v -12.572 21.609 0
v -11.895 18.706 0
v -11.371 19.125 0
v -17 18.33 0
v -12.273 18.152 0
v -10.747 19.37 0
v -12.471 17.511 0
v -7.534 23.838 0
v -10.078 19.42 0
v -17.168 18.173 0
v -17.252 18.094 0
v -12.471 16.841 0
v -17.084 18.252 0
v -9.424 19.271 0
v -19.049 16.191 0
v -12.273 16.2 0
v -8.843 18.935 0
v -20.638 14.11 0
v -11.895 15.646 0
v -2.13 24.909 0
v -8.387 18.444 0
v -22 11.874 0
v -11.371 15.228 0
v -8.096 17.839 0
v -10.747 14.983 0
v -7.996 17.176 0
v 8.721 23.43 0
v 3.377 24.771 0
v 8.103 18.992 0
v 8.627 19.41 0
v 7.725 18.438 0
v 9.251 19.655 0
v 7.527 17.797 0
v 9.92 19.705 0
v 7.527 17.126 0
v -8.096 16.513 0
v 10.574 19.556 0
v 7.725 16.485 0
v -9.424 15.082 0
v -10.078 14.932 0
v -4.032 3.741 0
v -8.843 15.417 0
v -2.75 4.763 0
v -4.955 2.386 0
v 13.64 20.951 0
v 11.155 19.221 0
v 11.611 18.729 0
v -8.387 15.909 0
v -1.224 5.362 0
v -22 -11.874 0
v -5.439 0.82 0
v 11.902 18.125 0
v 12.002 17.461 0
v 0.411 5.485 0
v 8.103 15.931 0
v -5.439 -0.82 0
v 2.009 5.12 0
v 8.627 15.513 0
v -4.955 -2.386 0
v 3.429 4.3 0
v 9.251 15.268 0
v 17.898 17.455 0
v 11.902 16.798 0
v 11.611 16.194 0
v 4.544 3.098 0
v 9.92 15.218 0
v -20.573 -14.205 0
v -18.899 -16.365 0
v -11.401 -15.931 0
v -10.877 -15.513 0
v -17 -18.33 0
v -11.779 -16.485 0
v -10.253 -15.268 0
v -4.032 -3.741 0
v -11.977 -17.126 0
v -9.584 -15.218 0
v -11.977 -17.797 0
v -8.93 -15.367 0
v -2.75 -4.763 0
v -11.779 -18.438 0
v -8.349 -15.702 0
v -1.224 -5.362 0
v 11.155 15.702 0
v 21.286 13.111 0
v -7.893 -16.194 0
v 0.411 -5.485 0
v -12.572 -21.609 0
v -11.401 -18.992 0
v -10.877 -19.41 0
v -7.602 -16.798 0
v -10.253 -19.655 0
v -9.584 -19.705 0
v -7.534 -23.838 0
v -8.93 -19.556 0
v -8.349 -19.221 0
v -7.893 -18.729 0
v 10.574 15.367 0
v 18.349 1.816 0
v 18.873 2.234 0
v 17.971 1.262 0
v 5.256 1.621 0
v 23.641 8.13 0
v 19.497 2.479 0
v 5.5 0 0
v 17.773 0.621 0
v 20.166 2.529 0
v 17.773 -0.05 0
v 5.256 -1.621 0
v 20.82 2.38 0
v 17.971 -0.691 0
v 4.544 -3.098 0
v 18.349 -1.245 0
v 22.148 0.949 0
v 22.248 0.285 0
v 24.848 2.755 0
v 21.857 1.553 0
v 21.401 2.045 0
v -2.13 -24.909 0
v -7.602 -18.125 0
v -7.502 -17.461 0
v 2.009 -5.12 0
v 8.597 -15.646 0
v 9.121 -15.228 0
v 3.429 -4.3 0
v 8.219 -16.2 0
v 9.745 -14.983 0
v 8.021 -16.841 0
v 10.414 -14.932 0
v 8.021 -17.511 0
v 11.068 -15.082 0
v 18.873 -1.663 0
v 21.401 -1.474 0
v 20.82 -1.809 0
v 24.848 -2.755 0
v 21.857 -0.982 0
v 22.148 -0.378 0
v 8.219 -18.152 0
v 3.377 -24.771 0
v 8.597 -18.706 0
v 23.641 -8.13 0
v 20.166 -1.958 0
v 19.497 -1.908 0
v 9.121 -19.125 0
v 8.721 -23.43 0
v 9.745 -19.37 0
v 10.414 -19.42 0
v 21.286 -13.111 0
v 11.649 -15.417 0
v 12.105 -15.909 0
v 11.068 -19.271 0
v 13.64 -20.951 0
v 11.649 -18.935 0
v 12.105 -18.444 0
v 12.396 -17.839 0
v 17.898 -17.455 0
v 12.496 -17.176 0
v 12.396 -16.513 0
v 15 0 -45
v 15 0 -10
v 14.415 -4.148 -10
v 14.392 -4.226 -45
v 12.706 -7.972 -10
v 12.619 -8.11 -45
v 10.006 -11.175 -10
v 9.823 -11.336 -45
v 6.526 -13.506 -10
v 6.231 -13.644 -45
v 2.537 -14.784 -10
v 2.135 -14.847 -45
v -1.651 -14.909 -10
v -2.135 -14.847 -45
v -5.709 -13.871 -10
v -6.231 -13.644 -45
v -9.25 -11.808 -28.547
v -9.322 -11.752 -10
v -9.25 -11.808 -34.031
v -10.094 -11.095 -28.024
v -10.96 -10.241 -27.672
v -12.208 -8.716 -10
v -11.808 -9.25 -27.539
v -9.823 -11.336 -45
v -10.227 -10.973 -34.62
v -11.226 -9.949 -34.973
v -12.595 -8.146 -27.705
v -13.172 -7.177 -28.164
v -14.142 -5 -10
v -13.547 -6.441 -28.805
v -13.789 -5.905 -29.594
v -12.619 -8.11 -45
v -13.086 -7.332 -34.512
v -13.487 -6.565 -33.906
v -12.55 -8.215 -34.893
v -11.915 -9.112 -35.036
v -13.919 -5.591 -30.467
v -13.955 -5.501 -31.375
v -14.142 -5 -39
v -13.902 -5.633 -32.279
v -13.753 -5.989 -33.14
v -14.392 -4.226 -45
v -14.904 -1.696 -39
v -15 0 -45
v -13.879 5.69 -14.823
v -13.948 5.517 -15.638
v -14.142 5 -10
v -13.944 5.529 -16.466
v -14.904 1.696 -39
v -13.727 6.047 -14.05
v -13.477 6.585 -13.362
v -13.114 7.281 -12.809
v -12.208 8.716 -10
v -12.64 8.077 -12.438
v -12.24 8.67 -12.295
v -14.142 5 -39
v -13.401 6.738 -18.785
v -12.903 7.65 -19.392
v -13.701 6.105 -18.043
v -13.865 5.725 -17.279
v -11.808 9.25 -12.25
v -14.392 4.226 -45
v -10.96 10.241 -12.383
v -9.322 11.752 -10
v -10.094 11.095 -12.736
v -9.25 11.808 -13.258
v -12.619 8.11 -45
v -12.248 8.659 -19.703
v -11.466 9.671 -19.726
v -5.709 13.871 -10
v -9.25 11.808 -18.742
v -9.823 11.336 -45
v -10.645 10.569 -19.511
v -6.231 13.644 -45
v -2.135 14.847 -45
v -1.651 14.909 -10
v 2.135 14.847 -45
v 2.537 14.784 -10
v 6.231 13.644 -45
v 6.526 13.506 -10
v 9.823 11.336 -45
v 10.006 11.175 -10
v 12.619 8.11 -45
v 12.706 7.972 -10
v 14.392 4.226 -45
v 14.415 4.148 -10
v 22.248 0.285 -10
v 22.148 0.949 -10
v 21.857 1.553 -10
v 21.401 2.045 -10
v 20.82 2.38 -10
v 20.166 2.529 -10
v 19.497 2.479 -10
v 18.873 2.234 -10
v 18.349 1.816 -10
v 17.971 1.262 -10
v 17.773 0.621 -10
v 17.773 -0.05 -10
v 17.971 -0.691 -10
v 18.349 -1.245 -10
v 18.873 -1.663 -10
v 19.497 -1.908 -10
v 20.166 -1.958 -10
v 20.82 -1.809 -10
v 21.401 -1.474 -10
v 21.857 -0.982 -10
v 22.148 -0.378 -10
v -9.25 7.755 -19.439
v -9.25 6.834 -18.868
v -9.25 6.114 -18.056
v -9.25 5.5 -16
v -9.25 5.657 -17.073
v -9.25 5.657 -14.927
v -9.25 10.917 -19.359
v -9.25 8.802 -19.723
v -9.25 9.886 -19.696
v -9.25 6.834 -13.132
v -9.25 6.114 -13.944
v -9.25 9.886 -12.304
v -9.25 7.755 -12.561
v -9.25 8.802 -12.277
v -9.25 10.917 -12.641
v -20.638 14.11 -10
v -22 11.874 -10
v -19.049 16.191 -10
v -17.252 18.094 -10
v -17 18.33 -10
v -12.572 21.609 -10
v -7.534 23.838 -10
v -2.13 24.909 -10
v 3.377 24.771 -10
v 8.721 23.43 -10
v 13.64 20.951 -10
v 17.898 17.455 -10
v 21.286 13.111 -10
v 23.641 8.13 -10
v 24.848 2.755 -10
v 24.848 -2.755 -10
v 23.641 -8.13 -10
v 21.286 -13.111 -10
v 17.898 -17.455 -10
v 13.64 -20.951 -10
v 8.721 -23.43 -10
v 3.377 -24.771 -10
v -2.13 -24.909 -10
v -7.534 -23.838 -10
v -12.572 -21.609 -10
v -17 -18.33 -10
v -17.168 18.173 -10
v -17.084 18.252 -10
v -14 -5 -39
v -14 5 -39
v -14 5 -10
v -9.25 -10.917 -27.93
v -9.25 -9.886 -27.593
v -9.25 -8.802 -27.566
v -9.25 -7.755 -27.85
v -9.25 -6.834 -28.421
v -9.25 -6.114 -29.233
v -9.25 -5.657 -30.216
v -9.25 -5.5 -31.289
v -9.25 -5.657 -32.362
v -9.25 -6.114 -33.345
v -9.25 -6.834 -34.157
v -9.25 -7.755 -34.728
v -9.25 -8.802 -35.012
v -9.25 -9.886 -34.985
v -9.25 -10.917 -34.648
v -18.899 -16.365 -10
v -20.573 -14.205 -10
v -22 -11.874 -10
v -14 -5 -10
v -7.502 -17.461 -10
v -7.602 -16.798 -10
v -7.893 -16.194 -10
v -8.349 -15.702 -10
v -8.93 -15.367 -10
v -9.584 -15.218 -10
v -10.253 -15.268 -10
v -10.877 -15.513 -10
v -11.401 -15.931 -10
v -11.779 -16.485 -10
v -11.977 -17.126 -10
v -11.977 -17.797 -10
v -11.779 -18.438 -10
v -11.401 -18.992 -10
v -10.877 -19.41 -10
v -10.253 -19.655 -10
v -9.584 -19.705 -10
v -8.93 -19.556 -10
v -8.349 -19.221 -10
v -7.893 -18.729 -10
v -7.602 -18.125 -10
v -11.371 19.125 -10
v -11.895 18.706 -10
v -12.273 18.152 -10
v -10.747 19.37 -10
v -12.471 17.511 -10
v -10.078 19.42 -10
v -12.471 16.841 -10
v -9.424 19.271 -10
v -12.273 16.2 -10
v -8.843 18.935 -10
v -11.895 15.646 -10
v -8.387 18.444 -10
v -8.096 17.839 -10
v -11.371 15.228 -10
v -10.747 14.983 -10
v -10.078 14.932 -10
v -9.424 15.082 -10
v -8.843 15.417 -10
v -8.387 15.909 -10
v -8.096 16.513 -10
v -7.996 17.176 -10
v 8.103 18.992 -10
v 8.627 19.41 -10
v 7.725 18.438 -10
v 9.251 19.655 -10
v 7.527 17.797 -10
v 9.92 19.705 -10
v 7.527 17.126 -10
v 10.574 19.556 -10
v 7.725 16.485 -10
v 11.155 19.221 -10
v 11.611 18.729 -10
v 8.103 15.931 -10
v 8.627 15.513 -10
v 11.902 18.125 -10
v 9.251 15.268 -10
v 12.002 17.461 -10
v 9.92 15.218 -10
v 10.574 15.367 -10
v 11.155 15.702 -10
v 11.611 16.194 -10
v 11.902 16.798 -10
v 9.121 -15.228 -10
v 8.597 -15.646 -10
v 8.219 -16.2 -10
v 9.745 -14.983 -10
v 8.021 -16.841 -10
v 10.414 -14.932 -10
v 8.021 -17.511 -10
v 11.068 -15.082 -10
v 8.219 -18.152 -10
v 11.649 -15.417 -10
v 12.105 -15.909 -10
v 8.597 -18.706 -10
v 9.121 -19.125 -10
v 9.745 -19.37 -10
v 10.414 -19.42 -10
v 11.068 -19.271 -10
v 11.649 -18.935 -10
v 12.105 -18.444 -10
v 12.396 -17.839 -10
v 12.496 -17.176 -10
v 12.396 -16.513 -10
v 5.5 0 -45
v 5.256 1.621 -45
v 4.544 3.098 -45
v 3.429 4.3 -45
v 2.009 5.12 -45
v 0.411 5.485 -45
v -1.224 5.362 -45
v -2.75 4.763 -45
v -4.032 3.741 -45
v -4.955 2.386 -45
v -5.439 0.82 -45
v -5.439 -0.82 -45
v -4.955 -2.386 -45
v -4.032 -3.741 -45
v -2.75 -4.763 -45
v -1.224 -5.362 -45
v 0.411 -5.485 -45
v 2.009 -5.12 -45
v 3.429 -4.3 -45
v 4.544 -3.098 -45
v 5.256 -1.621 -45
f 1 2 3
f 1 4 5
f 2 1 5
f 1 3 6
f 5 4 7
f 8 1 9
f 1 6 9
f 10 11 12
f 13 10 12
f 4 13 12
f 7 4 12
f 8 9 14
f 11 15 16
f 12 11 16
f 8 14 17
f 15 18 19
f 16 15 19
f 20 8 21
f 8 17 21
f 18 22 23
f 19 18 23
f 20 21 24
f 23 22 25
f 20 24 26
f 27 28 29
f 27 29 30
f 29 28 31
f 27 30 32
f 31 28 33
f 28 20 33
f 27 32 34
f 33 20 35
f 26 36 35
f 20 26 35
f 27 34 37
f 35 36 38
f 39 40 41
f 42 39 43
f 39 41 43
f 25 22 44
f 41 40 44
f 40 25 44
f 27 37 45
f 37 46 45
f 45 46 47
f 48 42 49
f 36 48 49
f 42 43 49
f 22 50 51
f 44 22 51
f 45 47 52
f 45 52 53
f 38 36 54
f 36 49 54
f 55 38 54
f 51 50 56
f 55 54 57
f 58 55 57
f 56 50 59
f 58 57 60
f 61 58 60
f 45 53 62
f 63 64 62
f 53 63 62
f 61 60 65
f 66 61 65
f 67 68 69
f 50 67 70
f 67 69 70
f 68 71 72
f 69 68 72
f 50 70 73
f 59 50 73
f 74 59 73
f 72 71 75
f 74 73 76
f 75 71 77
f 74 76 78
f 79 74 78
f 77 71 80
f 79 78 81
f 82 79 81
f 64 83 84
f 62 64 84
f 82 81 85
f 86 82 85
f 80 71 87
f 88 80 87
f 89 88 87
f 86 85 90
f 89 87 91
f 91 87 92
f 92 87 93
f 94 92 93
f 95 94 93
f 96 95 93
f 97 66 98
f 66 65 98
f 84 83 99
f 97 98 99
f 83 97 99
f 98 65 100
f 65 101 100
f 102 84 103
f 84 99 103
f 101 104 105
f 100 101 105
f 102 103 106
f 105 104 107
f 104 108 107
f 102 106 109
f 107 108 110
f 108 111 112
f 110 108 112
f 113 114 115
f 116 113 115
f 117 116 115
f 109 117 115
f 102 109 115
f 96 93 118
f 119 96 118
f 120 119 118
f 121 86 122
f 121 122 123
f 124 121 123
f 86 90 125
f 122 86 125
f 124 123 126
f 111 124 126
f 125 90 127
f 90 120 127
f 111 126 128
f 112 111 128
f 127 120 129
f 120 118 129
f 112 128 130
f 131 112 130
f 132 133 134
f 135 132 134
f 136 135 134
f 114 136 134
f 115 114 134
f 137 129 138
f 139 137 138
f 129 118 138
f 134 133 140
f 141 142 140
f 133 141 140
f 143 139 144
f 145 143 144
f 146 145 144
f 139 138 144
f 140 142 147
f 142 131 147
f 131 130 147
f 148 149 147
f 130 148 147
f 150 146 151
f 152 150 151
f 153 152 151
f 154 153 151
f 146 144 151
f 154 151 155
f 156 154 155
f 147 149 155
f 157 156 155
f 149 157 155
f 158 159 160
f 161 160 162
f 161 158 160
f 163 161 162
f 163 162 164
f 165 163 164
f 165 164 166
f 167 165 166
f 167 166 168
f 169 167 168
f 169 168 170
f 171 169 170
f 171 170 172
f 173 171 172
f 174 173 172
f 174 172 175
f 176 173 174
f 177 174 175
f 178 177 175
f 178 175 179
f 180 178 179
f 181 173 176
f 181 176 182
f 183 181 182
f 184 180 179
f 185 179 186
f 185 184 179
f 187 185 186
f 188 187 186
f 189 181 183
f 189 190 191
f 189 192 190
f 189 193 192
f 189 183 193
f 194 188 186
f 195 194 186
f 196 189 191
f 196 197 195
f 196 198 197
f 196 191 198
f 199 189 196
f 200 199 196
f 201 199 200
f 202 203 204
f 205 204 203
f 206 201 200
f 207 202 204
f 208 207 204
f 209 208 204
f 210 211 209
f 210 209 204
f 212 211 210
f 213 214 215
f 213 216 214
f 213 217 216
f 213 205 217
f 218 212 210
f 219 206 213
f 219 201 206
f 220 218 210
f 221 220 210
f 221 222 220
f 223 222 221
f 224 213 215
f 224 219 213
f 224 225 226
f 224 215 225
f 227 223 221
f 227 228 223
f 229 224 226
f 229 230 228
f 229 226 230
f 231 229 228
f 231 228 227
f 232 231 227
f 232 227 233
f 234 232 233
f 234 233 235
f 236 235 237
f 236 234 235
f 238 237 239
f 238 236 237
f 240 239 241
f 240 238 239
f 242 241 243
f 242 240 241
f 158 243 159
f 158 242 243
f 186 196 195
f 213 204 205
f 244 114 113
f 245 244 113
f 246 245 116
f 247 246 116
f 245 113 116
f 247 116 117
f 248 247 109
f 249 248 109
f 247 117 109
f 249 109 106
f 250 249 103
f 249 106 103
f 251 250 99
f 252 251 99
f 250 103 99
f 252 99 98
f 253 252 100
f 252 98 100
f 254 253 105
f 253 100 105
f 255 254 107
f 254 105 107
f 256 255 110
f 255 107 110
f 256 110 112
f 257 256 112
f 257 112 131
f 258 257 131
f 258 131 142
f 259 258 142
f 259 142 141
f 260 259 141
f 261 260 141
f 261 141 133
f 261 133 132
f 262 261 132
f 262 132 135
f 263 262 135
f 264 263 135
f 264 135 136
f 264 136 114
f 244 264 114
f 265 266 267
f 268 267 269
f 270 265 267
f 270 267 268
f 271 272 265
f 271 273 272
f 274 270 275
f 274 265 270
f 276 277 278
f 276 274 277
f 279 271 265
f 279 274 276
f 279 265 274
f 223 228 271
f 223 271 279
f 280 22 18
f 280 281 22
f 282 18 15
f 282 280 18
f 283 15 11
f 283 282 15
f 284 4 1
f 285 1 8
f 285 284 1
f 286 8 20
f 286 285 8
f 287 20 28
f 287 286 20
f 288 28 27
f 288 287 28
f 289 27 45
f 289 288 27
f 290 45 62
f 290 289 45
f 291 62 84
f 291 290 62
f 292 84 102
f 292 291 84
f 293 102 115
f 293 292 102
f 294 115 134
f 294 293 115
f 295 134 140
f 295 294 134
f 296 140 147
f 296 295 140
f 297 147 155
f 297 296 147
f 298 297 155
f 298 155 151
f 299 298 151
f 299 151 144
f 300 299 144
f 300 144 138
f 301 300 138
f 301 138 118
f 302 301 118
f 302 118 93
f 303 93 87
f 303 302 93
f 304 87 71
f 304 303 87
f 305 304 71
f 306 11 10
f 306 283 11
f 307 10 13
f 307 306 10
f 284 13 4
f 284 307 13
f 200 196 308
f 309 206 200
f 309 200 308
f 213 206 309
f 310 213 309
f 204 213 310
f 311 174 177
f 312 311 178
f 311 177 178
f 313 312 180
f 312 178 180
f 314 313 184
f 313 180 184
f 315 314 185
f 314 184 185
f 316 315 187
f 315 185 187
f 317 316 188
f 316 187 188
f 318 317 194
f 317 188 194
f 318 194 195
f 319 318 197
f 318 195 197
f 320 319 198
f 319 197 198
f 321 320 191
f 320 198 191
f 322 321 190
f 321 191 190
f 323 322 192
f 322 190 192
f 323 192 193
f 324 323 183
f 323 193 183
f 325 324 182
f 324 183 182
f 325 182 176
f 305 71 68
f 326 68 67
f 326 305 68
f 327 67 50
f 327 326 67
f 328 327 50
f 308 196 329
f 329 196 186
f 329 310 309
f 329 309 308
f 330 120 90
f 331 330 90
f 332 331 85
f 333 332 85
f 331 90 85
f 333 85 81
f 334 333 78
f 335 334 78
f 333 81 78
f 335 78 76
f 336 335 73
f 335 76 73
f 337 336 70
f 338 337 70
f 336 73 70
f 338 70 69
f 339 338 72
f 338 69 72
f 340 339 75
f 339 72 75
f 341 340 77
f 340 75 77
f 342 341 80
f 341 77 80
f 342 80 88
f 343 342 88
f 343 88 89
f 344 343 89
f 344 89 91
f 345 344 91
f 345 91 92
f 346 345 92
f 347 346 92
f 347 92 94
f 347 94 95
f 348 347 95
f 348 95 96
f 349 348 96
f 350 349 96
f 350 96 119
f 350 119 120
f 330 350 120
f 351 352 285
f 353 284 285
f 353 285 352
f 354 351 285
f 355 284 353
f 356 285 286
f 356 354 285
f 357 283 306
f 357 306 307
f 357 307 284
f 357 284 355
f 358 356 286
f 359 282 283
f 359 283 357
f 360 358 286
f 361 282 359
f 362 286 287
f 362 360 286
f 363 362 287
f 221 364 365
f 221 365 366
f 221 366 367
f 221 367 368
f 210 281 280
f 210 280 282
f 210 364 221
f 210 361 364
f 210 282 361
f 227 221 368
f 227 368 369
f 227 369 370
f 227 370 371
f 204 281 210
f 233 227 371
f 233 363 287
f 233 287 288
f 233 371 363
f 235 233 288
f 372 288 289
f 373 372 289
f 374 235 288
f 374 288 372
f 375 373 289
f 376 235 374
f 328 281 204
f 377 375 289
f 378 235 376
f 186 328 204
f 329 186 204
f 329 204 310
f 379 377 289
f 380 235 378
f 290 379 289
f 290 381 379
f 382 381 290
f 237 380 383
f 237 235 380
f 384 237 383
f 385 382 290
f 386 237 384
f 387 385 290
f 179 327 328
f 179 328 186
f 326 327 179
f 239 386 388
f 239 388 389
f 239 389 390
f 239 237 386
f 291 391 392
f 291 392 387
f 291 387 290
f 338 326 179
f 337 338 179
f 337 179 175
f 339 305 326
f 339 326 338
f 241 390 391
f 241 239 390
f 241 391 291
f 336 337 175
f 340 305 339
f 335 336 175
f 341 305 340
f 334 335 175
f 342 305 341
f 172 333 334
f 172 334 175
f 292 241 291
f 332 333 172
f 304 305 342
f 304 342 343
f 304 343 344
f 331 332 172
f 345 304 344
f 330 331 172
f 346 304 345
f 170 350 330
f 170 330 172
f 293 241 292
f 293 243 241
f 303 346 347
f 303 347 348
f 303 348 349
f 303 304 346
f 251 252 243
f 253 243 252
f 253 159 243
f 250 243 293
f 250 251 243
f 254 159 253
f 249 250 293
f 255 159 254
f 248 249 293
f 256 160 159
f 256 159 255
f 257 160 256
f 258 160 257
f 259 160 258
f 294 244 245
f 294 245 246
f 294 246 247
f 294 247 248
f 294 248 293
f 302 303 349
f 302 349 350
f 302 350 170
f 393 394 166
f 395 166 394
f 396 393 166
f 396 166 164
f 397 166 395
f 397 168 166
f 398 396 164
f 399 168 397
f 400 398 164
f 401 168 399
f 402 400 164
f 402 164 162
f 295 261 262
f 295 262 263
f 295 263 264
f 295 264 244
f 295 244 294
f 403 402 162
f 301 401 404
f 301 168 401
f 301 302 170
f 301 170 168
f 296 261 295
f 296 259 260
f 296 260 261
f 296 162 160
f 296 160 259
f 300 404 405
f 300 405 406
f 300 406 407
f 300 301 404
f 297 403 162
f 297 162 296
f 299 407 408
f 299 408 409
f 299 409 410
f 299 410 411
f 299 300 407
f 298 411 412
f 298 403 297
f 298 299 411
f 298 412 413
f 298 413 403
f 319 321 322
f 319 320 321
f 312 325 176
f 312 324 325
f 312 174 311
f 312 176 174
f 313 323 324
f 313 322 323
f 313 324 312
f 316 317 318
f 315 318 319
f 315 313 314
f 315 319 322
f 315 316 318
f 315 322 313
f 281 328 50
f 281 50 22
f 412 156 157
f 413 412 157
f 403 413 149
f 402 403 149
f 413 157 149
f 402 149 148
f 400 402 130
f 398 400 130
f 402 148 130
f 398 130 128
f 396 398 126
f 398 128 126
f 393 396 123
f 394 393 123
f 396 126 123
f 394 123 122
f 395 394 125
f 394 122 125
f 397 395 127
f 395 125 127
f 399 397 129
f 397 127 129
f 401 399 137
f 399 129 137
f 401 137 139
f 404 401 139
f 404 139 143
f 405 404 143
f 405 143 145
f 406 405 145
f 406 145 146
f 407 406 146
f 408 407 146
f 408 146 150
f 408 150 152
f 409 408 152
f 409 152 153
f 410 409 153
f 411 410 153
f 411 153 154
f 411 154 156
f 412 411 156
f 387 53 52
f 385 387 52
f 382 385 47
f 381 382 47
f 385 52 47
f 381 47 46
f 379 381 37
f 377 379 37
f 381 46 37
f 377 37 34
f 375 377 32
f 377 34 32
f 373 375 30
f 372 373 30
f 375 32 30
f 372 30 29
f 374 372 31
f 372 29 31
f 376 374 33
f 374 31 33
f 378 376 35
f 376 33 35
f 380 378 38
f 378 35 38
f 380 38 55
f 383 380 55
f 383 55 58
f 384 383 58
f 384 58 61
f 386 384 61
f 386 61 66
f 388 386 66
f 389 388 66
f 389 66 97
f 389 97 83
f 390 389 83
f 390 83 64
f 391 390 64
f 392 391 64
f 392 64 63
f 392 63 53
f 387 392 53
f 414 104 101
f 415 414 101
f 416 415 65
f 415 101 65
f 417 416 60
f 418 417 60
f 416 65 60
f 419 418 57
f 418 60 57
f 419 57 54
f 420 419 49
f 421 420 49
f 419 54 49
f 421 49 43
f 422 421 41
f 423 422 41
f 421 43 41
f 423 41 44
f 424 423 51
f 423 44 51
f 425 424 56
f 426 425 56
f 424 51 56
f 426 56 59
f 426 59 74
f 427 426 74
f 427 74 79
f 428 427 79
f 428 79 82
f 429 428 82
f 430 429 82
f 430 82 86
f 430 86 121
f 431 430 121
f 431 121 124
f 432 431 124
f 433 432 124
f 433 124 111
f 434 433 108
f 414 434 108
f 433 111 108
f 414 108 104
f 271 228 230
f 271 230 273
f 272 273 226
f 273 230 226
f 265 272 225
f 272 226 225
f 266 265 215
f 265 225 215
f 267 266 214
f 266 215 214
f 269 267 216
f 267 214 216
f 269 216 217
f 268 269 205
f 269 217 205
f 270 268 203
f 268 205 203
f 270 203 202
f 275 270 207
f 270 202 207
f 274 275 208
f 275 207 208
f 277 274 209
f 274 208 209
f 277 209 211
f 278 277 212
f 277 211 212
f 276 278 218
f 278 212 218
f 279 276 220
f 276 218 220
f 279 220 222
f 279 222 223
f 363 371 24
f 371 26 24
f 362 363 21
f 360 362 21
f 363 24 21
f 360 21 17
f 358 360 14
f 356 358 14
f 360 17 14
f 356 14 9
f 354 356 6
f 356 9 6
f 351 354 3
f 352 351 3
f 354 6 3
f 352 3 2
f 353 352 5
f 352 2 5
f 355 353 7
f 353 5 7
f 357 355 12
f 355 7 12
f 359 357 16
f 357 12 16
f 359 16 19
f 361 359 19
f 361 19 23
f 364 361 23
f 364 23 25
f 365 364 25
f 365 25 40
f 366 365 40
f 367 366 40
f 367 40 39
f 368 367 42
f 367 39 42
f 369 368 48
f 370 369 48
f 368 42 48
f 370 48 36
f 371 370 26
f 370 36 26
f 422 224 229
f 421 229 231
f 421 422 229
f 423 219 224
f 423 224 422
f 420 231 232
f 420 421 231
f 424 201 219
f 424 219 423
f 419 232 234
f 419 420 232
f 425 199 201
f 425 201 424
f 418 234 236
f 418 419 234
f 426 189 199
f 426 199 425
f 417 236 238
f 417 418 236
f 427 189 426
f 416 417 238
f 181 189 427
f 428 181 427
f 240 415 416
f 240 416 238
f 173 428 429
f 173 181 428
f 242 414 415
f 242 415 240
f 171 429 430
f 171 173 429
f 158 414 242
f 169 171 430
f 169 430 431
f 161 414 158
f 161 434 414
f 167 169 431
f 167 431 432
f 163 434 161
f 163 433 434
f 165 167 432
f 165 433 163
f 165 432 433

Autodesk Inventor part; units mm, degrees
ref_plane "YZ Plane" through (0, 0, 0) normal (1, 0, 0) x (0, 1, 0)
ref_plane "XZ Plane" through (0, 0, 0) normal (0, 1, 0) x (-1, 0, 0)
sketch "Sketch1" plane through (0, 0, 0) normal (0, 1, 0) x (-1, 0, 0)
  line L0 (0, 0) -> (-25, 0)
  line L1 (-25, 0) -> (-25, -10)
  line L2 (-25, -10) -> (-15, -10)
  line L3 (-15, -10) -> (-15, -45)
  line L4 (-15, -45) -> (0, -45)
  line L5 (0, 0) -> (0, -45)
  dimension "d3" = 25
  dimension "d4" = 10
  dimension "d5" = 10
  dimension "d6" = 35
  dimension "d7" = 15
revolve "Revolution1" add sketch "Sketch1" angle 360 about axis through (0, 0, 0) along (0, 0, -1)
sketch "Sketch2" plane through (0, 0, 0) normal (0, 0, 1) x (1, 0, 0)
  line L0 (0, 0) -> (30.242, 0) construction
  line L1 (0, 0.5707) -> (22.435, 0.5707) construction
  circle A0 centre (9.7519, 17.4614) radius 2.25
  circle A1 centre (19.998, 0.2854) radius 2.25
  circle A2 centre (10.2461, -17.1761) radius 2.25
  circle A3 centre (-9.7519, -17.4614) radius 2.25
  circle A4 centre (-19.998, -0.2854) radius 2.25
  circle A5 centre (-10.2461, 17.1761) radius 2.25
  dimension "d12" = 4.5
  dimension "d15" = 360
extrude "Extrusion1" cut sketch "Sketch2" against normal through all
sketch "Sketch3" plane through (0, 0, 0) normal (0, 0, 1) x (1, 0, 0)
  circle A0 centre (0, 0) radius 5.5
  dimension "d19" = 11
extrude "Extrusion2" cut sketch "Sketch3" against normal through all
thread "Thread1" size "1/2-13 UNC" class "2B" standard "ANSI Unified Screw Threads" full length
sketch "Sketch4" plane through (0, 0, 0) normal (0, 0, 1) x (1, 0, 0)
  circle A0 centre (0, 0) radius 25 projected
  line L0 (-17, 0) -> (-17, 18.3303)
  line L1 (-17, 0) -> (-17, -18.3303)
extrude "Extrusion3" cut sketch "Sketch4" against normal blind 15 contours L0 L1 A0 picked at (-18.2676, -10.7318)
ref_plane "Work Plane1" through (-15, 0, -27.5) normal (-1, 0, 0) x (0, -1, 0)
sketch "Sketch5" plane through (-15, 0, -27.5) normal (-1, 0, 0) x (0, -1, 0)
  line L0 (1.9646, 17.5) -> (-2.5354, 17.5) projected
  line L1 (15, -17.5) -> (-15, -17.5) projected
  line L2 (0, -11.5) -> (-5, -11.5)
  line L3 (-5.5, 27.5) -> (-5.5, -17.5) projected
  line L4 (-5, -11.5) -> (-5, 17.5)
  line L5 (15, 17.5) -> (-15, 17.5) projected
  line L6 (0, -11.5) -> (5, -11.5)
  line L7 (5, -11.5) -> (5, 17.5)
  line L8 (5, 17.5) -> (-5, 17.5)
  point P0 (0, 27.5)
extrude "Extrusion4" cut sketch "Sketch5" against normal blind 1
sketch "Sketch9" plane through (0, 0, -10) normal (0, 0, -1) x (-1, 0, 0)
  line L0 (14, 5) -> (14, -5) projected
  line L1 (14, 0) -> (22, 0)
  line L2 (22, 0) -> (22, -11.8743)
  line L3 (22, -11.8743) -> (22, 11.8743)
  arc A0 (22, 11.8743) -> (17.2515, 18.0938) centre (0, 0) ccw
  line L4 (17, -18.3303) -> (17, 18.3303) projected
  line L5 (17, 18.3303) -> (17, -18.3303)
  line L6 (17, 18.3303) -> (17, -18.3303) projected
  arc A1 (17, -18.3303) -> (22, -11.8743) centre (0, 0) ccw
  arc A2 (22, 11.8743) -> (17, 18.3303) centre (0, 0) ccw
  arc A3 (14.1421, 5) -> (14.1421, -5) centre (0, 0) ccw projected
  dimension "d59" = 8
extrude "Extrusion5" add sketch "Sketch9" against normal blind 10
sketch "Sketch20" plane through (-14, 0, -27.5) normal (-1, 0, 0) x (0, 0, 1)
  line L0 (17.5, -11.8743) -> (17.5, 11.8743) projected
  circle A0 centre (11.5, 9.25) radius 3.75
  line L1 (-17.5, -15) -> (-17.5, 15) projected
  line L2 (11.5, 9.25) -> (-3.7889, -9.25)
  circle A1 centre (-3.7889, -9.25) radius 3.75
  point P0 (27.5, 0)
  dimension "d85" = 7.5
  dimension "d87" = 24
  dimension "d88" = 7.5
extrude "Extrusion8" cut sketch "Sketch20" against normal blind 4.75
sketch "Sketch21" plane through (-22, -11.8743, -10) normal (0, 0, -1) x (-1, 0, 0)
  point P0 (-22, 11.8743)
sketch "Sketch22" plane through (-22, -11.8743, -10) normal (0, 0, -1) x (-1, 0, 0)
  point P0 (-22, 11.8743)
properties part number "nut"
